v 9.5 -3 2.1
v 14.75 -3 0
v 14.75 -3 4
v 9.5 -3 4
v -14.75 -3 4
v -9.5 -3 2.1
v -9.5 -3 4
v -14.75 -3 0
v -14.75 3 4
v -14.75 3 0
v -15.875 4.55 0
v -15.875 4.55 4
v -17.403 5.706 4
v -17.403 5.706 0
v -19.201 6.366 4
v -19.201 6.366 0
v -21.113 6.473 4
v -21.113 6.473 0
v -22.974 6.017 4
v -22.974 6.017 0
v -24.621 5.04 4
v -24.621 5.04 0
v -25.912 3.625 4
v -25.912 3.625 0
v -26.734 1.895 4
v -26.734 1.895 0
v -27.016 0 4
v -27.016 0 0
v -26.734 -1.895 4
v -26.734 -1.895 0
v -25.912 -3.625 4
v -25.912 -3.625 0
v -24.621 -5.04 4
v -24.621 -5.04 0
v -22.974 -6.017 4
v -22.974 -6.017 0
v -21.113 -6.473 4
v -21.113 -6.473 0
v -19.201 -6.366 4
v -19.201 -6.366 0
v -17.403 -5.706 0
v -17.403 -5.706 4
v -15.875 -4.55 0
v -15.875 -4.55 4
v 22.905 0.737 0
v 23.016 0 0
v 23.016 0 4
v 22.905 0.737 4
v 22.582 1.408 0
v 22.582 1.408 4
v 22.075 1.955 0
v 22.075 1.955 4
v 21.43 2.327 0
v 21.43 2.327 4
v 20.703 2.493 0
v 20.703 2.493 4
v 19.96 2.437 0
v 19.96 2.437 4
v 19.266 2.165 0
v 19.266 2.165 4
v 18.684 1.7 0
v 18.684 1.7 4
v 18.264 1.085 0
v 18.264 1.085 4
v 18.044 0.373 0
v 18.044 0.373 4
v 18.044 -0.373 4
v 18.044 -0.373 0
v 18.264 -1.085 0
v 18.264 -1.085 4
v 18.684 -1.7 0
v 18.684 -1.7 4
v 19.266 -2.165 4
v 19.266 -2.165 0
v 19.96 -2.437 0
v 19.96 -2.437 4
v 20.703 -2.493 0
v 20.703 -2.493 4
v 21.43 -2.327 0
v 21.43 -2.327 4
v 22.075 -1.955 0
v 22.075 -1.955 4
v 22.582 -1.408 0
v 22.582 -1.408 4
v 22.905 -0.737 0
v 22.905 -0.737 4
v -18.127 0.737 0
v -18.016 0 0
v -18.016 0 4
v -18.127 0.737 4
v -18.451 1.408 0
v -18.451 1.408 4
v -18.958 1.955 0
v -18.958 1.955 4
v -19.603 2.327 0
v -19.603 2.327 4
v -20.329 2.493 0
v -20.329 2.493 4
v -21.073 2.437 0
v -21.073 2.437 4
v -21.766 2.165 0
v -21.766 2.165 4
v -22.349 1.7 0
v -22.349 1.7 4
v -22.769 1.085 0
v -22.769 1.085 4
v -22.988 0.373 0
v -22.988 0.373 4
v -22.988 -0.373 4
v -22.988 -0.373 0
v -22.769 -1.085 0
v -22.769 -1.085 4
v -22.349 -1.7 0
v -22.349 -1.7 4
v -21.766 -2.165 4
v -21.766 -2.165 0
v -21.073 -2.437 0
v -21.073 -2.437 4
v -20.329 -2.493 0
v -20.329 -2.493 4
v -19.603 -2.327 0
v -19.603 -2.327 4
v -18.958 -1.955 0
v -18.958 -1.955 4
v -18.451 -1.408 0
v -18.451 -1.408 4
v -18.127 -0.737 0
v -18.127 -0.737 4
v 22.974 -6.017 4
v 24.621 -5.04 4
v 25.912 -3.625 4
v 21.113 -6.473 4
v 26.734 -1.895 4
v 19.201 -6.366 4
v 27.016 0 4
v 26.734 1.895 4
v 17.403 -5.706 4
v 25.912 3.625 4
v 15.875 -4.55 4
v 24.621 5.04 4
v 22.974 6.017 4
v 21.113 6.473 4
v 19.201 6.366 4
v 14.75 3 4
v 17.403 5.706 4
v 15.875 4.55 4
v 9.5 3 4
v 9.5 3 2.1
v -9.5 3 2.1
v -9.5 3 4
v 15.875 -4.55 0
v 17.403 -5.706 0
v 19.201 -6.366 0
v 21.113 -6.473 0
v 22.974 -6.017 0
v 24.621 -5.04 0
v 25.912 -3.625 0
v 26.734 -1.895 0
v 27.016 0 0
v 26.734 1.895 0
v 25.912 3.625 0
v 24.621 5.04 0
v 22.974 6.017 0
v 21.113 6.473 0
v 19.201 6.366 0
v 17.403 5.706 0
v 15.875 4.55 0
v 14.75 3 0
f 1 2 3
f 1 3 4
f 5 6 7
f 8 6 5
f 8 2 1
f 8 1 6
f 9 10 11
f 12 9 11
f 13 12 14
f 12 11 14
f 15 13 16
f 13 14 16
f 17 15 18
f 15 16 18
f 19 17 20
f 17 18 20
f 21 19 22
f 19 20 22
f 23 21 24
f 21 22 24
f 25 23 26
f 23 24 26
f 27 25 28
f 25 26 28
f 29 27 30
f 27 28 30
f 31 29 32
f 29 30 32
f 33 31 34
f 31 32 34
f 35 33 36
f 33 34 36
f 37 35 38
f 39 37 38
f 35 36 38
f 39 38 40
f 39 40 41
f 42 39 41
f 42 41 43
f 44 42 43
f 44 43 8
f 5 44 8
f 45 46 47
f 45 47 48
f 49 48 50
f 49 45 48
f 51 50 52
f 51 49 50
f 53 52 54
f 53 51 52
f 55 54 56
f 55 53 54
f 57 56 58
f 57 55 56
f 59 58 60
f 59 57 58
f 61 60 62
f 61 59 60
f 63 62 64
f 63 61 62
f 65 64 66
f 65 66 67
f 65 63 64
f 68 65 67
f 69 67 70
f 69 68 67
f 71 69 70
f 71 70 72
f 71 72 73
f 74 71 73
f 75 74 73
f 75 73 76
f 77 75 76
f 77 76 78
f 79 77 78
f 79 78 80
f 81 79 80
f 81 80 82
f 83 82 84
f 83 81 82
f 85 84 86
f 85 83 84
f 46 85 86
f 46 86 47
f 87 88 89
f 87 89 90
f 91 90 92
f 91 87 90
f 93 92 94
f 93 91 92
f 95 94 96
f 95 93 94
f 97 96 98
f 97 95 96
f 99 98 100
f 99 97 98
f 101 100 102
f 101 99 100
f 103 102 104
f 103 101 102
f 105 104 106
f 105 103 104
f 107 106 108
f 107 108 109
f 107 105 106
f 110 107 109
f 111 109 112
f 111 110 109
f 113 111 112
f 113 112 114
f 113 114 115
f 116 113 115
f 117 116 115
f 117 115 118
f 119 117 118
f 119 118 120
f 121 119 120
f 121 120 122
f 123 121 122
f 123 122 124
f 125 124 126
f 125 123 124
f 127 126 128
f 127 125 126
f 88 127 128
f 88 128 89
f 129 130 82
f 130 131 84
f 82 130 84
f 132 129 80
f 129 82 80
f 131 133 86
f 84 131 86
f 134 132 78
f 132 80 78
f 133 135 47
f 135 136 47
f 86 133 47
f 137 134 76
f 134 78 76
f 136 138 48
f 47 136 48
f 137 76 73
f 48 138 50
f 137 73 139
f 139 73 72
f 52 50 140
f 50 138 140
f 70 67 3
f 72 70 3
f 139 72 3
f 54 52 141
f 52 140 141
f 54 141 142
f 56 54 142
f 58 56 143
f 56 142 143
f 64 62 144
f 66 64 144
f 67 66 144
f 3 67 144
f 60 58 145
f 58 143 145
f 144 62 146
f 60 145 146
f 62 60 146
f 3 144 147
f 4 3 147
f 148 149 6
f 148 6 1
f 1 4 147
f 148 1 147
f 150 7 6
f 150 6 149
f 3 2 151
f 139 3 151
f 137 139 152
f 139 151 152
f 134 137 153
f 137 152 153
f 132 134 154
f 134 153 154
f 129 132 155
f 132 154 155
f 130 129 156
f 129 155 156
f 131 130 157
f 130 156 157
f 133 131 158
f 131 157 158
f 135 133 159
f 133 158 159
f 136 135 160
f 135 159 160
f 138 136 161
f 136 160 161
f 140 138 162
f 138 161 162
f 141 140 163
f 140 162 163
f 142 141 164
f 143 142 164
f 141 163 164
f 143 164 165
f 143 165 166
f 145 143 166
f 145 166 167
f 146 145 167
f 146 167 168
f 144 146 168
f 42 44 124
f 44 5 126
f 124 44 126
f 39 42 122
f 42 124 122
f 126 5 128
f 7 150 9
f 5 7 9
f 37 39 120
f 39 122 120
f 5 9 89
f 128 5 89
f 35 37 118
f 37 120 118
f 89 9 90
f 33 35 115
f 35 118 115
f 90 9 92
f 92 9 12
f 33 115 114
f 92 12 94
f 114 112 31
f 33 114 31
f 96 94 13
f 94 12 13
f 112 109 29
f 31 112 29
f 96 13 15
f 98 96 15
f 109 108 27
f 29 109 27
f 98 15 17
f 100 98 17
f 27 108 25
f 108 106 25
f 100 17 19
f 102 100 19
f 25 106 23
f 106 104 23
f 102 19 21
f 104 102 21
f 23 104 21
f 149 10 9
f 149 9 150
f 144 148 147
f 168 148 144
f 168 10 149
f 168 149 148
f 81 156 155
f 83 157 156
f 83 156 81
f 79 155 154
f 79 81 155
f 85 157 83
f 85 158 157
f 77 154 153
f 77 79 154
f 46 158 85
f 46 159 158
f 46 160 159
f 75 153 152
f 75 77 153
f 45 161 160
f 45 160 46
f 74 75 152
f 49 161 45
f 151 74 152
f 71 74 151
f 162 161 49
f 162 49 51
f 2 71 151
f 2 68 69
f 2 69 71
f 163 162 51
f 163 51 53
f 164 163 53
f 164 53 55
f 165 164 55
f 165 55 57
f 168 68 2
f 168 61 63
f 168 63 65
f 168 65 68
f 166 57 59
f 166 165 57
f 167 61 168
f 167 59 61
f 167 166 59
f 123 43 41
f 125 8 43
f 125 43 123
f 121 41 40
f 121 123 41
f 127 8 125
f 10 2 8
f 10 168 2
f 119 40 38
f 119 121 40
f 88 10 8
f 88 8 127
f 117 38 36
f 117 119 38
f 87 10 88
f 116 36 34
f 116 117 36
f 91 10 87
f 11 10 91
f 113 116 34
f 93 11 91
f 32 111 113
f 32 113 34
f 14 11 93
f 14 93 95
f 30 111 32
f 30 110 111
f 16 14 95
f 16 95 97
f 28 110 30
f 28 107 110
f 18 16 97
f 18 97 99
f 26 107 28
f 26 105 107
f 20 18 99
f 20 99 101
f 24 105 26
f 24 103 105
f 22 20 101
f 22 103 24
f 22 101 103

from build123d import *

# Parameters (mm, degrees)
SKETCH_R     = 2.5
PAD_DEPTH    = 4
SKETCH001_W  = 19
SKETCH001_H  = 6
POCKET_DEPTH = 1.9


with BuildPart() as part:
    # Sketch → Pad (new body)
    with BuildSketch(Plane.XY):
        with BuildLine():
            Line((-14.75, 3), (14.75, 3))
            ThreePointArc((14.75, -3), (27.016281, 0), (14.75, 3))
            Line((14.75, -3), (-14.75, -3))
            ThreePointArc((-14.75, 3), (-27.016281, 0), (-14.75, -3))
        make_face()
        with Locations((-20.516281, 0)):
            Circle(SKETCH_R, mode=Mode.SUBTRACT)
        with Locations((20.516281, 0)):
            Circle(SKETCH_R, mode=Mode.SUBTRACT)
    extrude(amount=PAD_DEPTH)

    # Sketch001 → Pocket (cut)
    with BuildSketch(Plane.XY.offset(4)):
        Rectangle(SKETCH001_W, SKETCH001_H)
    extrude(amount=-POCKET_DEPTH, mode=Mode.SUBTRACT)


solid = part.part
